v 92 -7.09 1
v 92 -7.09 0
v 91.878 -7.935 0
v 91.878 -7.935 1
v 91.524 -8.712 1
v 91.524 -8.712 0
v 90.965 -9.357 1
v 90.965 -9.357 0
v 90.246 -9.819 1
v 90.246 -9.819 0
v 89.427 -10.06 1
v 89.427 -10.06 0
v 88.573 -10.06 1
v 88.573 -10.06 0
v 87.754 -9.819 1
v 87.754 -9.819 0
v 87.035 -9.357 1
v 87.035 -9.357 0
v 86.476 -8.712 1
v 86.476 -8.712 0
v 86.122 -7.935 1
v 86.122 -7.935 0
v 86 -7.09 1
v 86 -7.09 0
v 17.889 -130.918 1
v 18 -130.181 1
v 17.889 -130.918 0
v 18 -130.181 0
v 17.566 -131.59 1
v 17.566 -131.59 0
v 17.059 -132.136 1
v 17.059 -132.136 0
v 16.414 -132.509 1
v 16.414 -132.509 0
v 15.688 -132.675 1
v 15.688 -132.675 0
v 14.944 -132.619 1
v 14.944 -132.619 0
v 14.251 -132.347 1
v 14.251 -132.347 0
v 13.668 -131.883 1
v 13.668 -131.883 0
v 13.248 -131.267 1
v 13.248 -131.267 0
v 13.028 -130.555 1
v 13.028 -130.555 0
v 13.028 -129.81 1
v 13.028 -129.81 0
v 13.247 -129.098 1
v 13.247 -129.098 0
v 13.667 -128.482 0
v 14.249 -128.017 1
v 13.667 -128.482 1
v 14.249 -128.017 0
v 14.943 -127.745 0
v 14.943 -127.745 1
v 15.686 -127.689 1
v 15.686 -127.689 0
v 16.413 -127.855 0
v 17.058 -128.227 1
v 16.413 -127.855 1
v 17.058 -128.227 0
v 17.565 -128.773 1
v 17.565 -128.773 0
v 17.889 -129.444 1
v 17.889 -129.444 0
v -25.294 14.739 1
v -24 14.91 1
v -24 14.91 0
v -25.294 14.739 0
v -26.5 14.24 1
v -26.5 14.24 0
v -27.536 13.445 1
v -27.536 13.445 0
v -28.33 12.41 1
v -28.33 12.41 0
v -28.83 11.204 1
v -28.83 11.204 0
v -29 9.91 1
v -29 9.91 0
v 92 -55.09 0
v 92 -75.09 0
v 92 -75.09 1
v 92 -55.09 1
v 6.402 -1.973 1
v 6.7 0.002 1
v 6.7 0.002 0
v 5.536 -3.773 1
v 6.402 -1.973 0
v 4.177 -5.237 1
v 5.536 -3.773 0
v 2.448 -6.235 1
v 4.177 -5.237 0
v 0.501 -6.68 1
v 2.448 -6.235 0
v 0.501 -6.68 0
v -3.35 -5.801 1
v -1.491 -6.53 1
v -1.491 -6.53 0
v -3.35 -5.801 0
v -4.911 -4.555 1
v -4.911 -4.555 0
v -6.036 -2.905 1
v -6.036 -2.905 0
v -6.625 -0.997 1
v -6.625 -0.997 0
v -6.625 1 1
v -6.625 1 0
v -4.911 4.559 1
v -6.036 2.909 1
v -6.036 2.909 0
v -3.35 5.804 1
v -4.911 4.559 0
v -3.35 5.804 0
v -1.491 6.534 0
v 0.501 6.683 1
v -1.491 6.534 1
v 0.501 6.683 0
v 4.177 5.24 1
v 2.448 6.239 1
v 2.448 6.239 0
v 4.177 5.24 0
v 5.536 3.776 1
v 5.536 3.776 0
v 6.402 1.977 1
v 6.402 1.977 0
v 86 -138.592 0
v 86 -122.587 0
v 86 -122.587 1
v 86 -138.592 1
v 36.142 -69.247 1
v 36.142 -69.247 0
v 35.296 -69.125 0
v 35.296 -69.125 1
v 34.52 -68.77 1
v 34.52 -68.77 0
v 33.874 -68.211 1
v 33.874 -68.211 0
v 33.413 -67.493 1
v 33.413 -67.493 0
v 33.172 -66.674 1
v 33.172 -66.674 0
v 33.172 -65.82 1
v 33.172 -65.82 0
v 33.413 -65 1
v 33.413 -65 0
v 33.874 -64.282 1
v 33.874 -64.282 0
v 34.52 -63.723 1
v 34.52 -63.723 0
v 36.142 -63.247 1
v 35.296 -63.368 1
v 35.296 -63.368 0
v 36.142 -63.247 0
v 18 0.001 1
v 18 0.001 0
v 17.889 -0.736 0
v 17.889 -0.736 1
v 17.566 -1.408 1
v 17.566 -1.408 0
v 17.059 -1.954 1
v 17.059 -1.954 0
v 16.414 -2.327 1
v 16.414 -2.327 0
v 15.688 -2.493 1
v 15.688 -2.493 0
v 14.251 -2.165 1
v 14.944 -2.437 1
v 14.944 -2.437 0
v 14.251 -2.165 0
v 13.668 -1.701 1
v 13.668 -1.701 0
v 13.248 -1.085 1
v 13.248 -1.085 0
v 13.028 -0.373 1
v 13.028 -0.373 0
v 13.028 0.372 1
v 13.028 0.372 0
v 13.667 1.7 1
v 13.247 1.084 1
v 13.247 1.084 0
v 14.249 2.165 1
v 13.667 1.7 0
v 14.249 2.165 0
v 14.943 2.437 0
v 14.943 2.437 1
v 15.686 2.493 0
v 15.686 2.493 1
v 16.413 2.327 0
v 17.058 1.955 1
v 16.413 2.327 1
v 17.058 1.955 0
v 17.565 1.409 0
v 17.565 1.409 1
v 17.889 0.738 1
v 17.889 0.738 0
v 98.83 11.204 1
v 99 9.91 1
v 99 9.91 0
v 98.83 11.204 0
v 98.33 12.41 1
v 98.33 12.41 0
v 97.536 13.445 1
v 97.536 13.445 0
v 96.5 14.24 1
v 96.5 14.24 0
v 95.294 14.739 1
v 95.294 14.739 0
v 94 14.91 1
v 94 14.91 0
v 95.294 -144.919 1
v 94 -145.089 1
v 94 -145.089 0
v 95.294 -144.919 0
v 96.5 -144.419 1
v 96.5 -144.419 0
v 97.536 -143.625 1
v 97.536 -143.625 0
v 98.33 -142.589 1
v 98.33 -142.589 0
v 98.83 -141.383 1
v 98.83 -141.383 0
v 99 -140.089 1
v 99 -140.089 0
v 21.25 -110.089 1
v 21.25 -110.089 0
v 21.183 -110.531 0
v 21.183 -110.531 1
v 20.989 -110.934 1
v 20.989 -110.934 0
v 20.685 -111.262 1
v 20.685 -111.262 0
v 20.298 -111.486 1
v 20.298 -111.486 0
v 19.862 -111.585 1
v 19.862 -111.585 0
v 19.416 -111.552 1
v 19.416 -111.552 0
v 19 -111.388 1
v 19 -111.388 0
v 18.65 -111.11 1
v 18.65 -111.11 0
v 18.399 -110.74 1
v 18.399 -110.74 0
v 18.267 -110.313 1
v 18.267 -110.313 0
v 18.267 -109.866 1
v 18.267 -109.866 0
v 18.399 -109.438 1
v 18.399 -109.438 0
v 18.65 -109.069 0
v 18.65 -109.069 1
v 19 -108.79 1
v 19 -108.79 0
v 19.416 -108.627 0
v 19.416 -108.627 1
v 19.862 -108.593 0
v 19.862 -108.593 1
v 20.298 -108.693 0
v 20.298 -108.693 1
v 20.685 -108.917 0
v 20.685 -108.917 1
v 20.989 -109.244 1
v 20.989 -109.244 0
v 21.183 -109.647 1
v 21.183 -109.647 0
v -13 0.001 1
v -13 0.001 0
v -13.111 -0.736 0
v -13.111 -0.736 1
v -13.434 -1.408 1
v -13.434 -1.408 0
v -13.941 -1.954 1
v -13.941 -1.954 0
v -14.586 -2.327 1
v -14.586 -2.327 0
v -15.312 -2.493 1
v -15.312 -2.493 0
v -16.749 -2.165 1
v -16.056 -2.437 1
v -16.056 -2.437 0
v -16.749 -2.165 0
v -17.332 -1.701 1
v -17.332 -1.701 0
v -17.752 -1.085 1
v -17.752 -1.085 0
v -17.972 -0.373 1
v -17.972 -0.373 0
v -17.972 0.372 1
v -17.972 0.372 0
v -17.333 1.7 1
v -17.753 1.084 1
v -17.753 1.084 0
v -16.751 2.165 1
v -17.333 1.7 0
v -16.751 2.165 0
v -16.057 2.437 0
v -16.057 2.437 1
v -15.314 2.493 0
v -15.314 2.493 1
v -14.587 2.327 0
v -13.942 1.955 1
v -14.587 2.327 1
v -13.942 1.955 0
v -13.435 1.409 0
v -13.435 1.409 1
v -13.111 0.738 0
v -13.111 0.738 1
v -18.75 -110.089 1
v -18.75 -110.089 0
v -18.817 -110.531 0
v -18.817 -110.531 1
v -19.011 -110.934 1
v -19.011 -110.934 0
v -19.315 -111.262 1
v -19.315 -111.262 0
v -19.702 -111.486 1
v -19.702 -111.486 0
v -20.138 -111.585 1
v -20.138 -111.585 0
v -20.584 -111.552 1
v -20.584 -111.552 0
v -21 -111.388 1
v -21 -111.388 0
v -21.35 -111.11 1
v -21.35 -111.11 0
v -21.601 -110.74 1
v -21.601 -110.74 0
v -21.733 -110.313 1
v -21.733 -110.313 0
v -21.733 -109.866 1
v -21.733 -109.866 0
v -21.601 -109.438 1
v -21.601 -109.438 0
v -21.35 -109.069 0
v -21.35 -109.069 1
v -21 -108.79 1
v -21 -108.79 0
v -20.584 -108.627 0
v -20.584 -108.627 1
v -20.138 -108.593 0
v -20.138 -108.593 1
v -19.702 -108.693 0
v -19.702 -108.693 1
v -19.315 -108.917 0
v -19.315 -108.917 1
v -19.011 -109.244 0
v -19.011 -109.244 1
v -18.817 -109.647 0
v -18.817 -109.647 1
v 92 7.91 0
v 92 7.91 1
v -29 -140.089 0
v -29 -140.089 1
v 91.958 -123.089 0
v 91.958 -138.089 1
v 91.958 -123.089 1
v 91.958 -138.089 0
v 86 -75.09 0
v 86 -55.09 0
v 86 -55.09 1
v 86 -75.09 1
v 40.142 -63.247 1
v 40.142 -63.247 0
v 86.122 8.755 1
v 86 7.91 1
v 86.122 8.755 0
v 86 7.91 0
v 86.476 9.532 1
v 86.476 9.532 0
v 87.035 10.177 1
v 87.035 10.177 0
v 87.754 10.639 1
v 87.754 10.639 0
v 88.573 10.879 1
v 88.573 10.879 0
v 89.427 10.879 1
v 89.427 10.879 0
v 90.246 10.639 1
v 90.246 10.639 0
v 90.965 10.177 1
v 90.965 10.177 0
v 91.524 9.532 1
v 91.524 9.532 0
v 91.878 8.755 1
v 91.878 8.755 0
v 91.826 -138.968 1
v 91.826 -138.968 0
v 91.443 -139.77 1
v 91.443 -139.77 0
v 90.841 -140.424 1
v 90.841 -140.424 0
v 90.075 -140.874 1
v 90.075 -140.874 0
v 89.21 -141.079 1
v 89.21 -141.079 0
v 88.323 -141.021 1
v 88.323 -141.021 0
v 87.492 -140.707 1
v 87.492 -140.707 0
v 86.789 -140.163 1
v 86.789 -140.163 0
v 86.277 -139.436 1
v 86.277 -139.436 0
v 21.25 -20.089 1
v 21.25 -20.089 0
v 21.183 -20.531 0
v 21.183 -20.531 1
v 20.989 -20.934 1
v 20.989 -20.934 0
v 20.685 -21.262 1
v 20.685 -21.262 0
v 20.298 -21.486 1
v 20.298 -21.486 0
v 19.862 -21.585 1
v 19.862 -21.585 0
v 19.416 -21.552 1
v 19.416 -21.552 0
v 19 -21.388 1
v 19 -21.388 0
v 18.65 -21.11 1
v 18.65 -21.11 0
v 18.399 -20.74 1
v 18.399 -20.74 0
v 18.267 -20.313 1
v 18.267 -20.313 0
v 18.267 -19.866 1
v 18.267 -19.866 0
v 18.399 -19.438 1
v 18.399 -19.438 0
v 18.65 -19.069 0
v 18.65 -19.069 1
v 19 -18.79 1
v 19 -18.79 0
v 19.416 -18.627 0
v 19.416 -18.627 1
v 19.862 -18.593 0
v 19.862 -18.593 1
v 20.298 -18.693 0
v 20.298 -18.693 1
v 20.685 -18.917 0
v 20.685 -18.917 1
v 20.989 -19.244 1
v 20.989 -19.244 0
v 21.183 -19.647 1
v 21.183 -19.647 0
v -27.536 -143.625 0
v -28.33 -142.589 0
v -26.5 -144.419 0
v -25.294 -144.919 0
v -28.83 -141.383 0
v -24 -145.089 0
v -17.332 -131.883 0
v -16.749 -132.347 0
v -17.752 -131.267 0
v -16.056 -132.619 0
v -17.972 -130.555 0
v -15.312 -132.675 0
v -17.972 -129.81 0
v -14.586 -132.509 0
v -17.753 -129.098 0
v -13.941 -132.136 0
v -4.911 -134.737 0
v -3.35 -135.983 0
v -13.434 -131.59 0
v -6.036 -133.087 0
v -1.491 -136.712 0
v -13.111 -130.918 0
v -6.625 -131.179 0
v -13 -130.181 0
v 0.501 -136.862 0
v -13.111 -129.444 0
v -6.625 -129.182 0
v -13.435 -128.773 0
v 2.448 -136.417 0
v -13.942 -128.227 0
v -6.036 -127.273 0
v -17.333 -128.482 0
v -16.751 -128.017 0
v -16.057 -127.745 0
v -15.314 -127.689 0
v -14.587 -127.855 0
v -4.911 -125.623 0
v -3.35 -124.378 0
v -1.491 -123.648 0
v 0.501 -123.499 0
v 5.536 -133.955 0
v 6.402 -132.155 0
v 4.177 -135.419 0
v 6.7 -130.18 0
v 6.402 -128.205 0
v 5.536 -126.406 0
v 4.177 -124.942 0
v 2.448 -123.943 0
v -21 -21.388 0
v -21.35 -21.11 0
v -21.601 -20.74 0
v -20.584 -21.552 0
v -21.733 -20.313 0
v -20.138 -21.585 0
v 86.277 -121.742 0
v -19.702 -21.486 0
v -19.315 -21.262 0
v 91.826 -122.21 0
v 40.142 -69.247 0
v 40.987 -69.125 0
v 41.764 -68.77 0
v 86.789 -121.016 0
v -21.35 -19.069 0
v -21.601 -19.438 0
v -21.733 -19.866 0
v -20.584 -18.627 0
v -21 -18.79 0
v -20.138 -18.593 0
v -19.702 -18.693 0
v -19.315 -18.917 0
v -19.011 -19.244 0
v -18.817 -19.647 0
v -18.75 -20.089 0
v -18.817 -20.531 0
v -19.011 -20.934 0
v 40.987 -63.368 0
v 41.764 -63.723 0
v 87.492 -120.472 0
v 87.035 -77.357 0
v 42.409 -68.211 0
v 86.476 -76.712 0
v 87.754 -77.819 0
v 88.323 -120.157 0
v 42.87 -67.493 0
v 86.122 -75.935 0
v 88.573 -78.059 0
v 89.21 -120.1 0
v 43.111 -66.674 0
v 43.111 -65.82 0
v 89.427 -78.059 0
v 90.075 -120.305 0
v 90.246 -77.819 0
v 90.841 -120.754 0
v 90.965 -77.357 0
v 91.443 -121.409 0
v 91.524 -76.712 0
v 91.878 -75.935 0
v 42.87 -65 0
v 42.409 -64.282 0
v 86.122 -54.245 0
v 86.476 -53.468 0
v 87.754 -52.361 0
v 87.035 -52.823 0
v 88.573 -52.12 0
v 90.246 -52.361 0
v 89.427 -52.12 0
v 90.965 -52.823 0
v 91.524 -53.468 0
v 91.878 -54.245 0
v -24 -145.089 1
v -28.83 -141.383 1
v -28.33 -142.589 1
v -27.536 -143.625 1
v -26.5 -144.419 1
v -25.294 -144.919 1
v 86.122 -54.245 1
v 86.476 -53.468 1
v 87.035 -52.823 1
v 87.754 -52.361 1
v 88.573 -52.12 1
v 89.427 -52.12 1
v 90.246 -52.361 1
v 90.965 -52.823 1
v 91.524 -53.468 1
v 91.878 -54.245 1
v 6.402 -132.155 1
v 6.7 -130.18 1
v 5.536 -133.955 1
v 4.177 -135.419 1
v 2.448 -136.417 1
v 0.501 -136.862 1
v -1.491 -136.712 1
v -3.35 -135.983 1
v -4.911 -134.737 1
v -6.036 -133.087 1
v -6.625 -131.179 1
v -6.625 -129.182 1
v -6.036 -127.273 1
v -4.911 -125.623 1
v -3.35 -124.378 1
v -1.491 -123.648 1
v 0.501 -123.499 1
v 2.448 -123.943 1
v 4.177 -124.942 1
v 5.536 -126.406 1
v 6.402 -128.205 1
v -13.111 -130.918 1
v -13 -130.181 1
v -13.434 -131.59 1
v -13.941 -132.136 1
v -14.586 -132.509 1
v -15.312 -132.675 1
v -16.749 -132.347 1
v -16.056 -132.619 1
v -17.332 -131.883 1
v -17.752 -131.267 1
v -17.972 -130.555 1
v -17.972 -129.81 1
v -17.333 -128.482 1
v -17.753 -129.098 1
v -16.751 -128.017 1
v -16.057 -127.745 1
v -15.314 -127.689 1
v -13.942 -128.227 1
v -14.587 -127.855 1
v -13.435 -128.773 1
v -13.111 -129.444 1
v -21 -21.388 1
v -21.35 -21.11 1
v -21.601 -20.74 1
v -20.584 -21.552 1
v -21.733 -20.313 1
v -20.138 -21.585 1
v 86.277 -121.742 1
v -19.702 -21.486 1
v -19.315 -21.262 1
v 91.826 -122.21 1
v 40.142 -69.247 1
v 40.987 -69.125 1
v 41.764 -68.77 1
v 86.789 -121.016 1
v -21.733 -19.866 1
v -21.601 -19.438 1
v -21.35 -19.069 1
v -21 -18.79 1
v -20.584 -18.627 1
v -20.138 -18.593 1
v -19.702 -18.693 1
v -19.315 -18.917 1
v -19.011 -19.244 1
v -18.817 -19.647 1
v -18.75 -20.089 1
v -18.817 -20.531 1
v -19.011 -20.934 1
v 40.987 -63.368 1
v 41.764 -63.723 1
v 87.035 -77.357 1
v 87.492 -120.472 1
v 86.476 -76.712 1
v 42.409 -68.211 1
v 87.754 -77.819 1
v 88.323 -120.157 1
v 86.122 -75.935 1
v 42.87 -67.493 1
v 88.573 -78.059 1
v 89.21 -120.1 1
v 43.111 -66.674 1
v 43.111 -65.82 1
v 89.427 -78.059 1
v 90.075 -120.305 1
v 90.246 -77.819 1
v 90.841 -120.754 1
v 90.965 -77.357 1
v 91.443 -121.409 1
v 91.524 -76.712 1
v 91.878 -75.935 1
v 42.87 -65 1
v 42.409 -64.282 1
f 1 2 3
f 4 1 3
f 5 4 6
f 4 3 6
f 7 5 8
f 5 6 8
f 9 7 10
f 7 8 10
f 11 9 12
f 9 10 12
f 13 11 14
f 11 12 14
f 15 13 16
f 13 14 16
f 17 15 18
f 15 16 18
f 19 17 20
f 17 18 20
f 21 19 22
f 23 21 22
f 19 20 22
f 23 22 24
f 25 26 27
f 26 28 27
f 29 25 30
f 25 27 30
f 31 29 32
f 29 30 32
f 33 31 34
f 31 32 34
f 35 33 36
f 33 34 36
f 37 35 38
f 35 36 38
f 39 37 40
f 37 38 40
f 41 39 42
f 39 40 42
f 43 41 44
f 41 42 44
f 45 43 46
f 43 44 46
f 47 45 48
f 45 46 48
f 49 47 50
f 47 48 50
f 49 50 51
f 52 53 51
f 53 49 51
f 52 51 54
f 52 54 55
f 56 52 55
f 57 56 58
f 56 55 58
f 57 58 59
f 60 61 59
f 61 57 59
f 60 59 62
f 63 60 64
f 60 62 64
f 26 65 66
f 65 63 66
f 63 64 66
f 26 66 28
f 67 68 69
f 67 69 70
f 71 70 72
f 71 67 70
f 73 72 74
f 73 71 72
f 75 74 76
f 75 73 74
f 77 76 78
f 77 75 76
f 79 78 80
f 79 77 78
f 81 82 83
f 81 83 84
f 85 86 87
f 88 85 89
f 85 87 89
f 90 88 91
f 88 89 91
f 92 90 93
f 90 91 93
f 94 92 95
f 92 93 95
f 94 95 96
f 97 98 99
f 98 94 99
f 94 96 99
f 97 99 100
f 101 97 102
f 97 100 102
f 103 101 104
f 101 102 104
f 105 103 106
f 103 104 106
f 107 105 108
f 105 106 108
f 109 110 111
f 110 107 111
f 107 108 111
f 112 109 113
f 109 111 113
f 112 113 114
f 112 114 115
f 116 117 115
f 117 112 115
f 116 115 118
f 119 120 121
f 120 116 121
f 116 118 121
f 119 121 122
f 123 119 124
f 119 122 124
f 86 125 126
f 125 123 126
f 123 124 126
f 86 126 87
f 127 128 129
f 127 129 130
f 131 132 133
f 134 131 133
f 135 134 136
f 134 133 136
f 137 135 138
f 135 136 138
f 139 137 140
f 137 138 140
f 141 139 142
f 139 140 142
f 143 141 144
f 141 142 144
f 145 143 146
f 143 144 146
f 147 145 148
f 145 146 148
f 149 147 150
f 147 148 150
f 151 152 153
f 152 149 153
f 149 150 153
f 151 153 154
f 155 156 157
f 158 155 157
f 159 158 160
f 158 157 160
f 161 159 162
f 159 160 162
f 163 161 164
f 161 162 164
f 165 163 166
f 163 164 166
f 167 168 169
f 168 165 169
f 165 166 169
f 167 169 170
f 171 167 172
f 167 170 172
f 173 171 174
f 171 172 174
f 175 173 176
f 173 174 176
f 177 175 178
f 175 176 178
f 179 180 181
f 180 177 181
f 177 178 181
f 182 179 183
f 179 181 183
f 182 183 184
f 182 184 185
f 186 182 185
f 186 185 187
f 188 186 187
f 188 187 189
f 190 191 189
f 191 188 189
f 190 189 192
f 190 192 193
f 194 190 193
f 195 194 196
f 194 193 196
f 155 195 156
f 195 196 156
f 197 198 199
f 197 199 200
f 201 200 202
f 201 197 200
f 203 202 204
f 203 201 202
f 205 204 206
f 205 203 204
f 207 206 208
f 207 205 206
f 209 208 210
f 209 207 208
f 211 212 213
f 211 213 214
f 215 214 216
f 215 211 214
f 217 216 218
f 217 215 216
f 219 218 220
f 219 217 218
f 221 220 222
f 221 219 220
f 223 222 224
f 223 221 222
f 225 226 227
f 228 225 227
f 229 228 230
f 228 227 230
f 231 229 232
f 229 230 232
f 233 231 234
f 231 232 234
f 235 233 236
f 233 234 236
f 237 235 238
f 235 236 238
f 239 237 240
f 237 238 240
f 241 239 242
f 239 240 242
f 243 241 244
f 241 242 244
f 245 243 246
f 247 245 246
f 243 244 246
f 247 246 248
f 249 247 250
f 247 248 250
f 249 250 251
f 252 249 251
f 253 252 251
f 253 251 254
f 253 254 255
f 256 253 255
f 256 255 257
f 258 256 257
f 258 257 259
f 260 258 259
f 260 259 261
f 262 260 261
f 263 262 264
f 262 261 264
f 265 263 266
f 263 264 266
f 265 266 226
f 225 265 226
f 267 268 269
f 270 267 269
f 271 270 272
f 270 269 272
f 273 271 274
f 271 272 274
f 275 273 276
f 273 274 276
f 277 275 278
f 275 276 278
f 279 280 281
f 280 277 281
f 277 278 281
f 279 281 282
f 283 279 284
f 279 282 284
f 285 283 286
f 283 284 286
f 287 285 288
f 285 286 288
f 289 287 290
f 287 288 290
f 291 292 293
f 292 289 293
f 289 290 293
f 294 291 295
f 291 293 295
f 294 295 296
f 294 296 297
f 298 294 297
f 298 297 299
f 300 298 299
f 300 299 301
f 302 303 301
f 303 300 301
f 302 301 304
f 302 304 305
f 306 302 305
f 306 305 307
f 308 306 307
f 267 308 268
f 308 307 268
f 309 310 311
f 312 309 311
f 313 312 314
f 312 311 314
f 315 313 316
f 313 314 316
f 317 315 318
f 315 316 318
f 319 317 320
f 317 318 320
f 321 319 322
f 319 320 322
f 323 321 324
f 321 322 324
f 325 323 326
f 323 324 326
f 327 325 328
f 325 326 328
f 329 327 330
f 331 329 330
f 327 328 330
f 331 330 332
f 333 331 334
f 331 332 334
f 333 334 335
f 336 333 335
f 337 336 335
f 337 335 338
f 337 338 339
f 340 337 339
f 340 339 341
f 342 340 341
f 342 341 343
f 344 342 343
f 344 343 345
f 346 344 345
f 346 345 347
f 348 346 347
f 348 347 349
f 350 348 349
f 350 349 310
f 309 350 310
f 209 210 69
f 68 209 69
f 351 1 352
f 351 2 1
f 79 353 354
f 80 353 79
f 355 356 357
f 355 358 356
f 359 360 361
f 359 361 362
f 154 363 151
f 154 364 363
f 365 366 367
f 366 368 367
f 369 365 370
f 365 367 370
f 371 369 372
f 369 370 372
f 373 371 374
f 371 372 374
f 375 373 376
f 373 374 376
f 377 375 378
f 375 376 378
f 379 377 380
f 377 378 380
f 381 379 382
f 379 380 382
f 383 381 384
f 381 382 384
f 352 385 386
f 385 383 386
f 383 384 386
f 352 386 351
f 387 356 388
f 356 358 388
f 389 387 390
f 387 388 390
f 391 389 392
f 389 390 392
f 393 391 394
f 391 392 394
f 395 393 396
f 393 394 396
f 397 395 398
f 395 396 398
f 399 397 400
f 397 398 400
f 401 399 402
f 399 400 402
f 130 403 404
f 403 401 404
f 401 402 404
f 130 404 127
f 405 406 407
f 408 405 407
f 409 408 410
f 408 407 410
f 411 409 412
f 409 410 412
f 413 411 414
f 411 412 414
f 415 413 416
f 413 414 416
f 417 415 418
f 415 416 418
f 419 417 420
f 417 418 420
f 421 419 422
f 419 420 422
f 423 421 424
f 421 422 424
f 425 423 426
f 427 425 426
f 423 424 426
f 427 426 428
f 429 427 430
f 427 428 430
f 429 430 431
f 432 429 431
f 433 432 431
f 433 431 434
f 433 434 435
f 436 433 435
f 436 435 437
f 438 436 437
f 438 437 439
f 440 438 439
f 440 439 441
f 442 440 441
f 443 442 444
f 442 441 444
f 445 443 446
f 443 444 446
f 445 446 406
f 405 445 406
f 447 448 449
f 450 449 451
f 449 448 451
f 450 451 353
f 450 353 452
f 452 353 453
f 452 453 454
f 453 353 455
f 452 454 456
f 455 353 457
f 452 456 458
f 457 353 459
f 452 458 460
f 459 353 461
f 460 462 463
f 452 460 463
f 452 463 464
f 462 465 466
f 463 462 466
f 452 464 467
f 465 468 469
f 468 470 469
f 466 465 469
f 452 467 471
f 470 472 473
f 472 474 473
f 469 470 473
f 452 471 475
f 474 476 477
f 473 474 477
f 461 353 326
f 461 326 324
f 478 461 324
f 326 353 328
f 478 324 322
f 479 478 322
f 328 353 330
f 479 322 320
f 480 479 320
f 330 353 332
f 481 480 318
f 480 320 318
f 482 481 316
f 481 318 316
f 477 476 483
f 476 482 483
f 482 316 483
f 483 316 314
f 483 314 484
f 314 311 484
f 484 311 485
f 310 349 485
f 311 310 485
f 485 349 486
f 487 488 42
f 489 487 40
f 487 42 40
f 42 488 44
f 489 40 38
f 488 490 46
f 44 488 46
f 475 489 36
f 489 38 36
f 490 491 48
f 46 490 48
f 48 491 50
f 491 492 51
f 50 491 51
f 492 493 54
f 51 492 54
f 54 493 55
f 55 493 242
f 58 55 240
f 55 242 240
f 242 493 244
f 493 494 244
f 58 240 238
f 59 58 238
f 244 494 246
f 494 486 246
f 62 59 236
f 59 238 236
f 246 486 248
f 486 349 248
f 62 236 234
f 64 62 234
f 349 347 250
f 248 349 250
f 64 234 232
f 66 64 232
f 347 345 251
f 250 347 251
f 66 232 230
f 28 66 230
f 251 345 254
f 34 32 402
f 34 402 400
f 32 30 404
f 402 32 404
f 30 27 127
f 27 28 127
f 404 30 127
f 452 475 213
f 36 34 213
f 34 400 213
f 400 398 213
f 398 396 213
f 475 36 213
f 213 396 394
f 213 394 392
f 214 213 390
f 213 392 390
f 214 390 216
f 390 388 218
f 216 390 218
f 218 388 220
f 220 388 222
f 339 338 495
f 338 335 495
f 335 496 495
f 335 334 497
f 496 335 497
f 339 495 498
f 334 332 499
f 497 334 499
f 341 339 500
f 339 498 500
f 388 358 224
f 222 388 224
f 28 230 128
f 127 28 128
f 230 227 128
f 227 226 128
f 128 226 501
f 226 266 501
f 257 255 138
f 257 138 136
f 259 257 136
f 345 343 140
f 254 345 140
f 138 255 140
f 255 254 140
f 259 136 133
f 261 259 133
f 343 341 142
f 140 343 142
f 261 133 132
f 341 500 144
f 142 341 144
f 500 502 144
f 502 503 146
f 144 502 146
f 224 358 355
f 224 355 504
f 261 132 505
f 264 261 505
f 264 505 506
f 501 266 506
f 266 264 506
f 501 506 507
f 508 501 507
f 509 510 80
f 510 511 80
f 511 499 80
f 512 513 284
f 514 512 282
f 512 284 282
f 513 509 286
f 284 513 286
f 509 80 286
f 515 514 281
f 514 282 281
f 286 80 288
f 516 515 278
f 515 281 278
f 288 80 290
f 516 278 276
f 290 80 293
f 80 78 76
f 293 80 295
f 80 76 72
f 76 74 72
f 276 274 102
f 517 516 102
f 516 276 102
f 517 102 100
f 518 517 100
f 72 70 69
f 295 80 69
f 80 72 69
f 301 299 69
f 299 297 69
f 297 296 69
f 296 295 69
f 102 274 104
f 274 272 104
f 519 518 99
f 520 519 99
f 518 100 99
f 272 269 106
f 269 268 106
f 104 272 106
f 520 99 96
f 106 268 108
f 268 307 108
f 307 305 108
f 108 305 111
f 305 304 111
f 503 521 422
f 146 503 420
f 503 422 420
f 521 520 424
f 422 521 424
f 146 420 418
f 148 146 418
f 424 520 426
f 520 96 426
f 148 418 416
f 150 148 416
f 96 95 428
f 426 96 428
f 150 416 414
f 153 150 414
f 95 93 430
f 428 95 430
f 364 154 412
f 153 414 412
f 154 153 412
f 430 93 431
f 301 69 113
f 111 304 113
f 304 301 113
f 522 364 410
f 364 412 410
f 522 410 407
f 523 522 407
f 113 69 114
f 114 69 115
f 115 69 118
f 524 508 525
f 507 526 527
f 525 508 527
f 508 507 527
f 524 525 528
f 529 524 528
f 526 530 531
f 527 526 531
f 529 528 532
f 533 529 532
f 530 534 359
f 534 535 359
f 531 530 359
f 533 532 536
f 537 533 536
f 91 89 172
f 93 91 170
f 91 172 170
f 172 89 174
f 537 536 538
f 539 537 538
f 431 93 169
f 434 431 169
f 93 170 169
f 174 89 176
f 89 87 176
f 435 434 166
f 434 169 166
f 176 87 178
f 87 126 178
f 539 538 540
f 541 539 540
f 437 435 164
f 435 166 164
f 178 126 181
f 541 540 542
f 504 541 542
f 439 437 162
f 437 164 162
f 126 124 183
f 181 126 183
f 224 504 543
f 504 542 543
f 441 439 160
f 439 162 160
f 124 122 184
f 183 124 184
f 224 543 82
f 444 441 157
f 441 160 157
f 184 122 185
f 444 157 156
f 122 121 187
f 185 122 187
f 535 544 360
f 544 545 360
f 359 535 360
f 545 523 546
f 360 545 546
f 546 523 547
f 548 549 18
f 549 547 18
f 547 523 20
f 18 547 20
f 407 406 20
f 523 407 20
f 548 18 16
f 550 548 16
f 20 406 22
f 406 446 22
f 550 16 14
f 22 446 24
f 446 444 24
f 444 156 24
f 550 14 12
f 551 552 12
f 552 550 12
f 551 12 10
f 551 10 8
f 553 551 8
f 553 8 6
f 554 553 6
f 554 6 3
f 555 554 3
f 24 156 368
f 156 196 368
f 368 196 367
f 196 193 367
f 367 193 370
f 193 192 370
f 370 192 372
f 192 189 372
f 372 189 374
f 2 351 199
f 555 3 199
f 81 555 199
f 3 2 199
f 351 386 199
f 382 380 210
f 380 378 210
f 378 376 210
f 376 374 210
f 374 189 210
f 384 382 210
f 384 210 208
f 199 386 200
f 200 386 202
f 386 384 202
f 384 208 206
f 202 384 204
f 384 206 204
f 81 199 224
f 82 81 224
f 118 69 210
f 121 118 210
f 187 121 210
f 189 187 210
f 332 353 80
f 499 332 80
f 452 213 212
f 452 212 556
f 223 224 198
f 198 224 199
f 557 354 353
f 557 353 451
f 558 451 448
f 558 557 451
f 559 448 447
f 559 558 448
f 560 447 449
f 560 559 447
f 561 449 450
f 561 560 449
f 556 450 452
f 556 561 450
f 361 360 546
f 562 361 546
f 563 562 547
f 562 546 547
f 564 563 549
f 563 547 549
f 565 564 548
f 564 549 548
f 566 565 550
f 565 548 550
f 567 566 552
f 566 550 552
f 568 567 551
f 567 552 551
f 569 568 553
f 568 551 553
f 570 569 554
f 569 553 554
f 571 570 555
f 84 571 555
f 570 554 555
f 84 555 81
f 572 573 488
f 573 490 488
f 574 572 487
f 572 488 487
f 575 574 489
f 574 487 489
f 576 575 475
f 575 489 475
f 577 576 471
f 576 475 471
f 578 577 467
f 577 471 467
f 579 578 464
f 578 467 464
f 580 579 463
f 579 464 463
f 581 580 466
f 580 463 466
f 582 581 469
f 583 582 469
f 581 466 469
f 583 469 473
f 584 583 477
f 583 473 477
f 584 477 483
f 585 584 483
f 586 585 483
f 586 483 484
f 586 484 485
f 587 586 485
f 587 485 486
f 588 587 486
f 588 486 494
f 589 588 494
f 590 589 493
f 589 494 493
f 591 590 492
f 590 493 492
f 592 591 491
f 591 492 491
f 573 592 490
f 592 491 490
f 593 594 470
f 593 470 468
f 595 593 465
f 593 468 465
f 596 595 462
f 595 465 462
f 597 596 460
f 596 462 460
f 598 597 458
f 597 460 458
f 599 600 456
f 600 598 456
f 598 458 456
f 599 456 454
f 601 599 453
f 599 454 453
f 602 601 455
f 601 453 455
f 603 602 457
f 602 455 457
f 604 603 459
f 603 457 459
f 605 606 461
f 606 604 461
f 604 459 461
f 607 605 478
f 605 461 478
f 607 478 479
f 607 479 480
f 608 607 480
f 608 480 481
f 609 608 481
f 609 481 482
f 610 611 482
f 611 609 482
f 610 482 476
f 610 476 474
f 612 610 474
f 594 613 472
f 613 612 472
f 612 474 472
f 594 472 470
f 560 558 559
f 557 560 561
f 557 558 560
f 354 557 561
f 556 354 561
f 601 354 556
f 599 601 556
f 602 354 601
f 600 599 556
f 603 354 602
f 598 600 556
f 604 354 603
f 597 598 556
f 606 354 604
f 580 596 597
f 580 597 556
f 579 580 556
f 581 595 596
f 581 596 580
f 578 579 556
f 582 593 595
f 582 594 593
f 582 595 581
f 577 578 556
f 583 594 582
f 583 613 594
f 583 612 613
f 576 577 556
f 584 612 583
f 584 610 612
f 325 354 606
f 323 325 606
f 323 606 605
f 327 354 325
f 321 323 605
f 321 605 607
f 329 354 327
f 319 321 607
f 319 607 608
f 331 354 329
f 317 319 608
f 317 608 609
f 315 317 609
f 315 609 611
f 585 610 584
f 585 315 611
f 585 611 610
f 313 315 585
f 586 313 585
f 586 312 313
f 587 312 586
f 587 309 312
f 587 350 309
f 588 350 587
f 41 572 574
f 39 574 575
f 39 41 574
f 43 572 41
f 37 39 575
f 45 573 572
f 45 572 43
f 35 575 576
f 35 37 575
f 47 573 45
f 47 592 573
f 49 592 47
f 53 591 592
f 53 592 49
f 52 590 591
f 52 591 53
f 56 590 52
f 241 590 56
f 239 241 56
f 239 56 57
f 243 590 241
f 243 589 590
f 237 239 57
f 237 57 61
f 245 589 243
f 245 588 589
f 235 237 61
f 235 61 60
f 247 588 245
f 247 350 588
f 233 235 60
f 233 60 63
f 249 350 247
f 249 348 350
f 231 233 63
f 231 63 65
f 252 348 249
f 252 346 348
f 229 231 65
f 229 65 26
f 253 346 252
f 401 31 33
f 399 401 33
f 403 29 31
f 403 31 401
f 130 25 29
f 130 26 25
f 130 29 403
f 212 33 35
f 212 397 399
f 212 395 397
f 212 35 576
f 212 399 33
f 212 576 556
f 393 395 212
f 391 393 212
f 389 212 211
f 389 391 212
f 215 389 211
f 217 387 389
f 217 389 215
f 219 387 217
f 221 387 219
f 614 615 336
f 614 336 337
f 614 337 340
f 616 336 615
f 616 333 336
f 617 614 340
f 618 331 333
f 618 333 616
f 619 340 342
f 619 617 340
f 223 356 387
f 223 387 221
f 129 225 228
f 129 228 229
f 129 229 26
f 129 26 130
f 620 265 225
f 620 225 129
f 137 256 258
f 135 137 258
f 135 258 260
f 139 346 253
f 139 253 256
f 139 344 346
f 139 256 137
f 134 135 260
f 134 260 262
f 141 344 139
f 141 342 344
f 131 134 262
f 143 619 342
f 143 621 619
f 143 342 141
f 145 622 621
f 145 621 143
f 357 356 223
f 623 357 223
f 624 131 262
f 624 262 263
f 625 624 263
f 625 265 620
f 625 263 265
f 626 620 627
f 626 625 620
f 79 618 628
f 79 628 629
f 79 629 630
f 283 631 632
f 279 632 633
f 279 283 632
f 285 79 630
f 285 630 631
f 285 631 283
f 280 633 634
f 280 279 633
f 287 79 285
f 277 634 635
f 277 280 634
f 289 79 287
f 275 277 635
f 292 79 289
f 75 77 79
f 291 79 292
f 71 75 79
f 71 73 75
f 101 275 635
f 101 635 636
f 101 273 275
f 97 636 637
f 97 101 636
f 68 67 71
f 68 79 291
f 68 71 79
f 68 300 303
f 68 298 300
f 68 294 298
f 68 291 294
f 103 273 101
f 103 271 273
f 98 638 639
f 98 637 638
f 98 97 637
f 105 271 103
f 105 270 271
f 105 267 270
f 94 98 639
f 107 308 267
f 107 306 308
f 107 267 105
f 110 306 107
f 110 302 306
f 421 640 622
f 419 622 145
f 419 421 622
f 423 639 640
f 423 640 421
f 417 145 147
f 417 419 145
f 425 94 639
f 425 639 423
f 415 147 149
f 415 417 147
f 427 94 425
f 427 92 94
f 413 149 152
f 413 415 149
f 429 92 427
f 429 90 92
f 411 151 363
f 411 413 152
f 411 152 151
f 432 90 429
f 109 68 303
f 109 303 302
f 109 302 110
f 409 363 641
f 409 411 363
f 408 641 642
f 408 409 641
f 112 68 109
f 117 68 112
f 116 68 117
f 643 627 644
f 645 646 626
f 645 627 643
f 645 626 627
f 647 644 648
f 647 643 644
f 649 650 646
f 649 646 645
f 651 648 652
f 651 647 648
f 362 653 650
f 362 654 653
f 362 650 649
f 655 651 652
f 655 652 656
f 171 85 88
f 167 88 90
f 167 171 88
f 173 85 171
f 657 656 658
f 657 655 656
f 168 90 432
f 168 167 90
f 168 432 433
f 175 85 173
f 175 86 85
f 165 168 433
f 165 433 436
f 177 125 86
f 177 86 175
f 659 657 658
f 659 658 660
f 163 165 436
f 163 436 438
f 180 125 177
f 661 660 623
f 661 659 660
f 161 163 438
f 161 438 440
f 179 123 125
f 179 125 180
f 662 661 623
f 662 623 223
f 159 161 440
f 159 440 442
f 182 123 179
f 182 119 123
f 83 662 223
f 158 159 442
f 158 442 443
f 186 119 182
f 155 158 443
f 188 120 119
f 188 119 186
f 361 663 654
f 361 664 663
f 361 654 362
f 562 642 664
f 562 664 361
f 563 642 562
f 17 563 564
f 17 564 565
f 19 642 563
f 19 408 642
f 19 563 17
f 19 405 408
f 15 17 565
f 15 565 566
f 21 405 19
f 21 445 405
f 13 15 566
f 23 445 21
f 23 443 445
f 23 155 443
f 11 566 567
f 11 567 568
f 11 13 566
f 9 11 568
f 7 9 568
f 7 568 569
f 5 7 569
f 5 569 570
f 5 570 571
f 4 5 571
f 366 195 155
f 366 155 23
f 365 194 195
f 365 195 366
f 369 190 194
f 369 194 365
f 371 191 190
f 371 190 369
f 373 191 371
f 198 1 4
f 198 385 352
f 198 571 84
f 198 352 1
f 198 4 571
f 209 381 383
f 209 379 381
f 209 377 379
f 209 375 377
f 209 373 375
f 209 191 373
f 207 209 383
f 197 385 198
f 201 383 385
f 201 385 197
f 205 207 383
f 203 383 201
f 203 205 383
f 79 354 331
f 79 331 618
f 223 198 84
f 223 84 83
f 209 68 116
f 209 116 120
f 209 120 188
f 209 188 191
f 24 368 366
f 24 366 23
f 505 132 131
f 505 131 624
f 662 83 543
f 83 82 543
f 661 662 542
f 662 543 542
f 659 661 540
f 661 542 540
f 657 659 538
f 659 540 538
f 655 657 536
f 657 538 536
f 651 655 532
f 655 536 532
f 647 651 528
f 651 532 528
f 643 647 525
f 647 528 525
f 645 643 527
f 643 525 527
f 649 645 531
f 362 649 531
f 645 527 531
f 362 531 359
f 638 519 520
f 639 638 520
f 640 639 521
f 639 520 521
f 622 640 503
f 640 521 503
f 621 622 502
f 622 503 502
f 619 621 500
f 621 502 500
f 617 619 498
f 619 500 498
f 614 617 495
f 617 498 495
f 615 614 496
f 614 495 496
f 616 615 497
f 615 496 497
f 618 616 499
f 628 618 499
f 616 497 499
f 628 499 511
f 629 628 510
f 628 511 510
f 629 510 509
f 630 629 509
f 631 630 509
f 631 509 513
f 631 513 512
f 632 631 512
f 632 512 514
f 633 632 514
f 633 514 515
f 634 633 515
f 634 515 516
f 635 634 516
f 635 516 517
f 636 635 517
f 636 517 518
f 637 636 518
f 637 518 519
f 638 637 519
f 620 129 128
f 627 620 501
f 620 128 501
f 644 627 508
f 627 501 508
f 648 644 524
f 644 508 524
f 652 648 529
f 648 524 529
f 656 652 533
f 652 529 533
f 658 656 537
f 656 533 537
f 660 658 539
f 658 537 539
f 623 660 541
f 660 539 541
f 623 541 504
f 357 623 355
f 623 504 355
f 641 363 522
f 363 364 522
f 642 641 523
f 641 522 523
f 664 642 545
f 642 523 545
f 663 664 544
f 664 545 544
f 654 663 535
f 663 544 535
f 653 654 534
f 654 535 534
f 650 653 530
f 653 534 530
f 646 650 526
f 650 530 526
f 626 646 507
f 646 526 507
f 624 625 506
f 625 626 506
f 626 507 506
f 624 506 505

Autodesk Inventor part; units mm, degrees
ref_plane "YZ Plane" through (0, 0, 0) normal (1, 0, 0) x (0, 1, 0)
ref_plane "XZ Plane" through (0, 0, 0) normal (0, 1, 0) x (-1, 0, 0)
ref_plane "XY Plane" through (0, 0, 0) normal (0, 0, 1) x (1, 0, 0)
sketch "スケッチ1" plane through (0, 0, 0) normal (0, 0, 1) x (1, 0, 0)
  circle A0 centre (-15.5, 0) radius 2.5 projected
  circle A1 centre (15.5, 0) radius 2.5 projected
  circle A2 centre (0, 0) radius 11 projected
  line L0 (-15.1987, 13) -> (15.1987, 13) projected
  arc A3 (15.1987, -13) -> (15.1987, 13) centre (0, 0) ccw projected
  line L1 (15.1987, -13) -> (-15.1987, -13) projected
  arc A4 (-15.1987, 13) -> (-15.1987, -13) centre (0, 0) ccw projected
  circle A5 centre (-15.5, -130.182) radius 2.5 projected
  circle A6 centre (15.5, -130.182) radius 2.5 projected
  circle A7 centre (0, -130.182) radius 11 projected
  line L2 (-15.1987, -143.182) -> (15.1987, -143.182) projected
  arc A8 (-15.1987, -117.182) -> (-15.1987, -143.182) centre (0, -130.182) ccw projected
  line L3 (15.1987, -117.182) -> (-15.1987, -117.182) projected
  arc A9 (15.1987, -143.182) -> (15.1987, -117.182) centre (0, -130.182) ccw projected
  circle A10 centre (0, -130.182) radius 5 projected
  circle A11 centre (0, 0) radius 5 projected
  line L4 (-29, -33.3404) -> (-29, 14.9098) projected
  line L5 (99, -145.0893) -> (-29, -145.0893) projected
  line L6 (-29, -63.34) -> (-29, -33.3408)
  line L7 (99, -145.0893) -> (99, 14.9098)
  line L8 (99, 14.9098) -> (297.1795, 14.9098)
  line L9 (297.1795, 14.9098) -> (297.1795, -145.0893)
  line L10 (297.1795, -145.0893) -> (99, -145.0893)
  circle A12 centre (0, -130.1819) radius 55
  circle A13 centre (0, 0.0009) radius 55
  line L11 (297.1795, -145.0893) -> (237.1795, -145.0893)
  line L12 (237.1795, -145.0893) -> (237.1795, 14.9098)
  line L13 (237.1795, 14.9098) -> (297.1795, 14.9098)
  line L14 (297.1795, 14.9098) -> (297.1795, -145.0893)
  line L15 (99, 14.9098) -> (-29, 14.9098) projected
  line L16 (99, 14.9098) -> (99, -145.0893) projected
  line L17 (92, -168.0902) -> (92, 36.9098) projected
  line L18 (86, 36.9098) -> (86, -168.0902) projected
  line L19 (89, 7.9098) -> (89, -7.0902) construction
  line L20 (92, 7.9098) -> (92, -7.0902)
  line L21 (86, -7.0902) -> (86, 7.9098)
  arc A14 (92, 7.9098) -> (86, 7.9098) centre (89, 7.9098) ccw
  arc A15 (86, -7.0902) -> (92, -7.0902) centre (89, -7.0902) ccw
  line L22 (87.3545, -74.7724) -> (87.3545, -54.7724) construction
  line L23 (90.3545, -74.7724) -> (90.3545, -54.7724)
  line L24 (84.3545, -54.7724) -> (84.3545, -74.7724)
  arc A16 (84.3545, -74.7724) -> (90.3545, -74.7724) centre (87.3545, -74.7724) ccw
  arc A17 (90.3545, -54.7724) -> (84.3545, -54.7724) centre (87.3545, -54.7724) ccw
  line L25 (-29, -145.0893) -> (-0.25, -145.0893)
  line L26 (-0.25, -145.0893) -> (-0.25, 14.9098)
  line L27 (-0.25, 14.9098) -> (-29, 14.9098)
  line L28 (-29, 14.9098) -> (-29, -145.0893)
  line L29 (19.75, -105.0893) -> (19.75, -25.0893)
  line L30 (19.75, -25.0893) -> (-20.25, -25.0893)
  line L31 (-20.25, -25.0893) -> (-20.25, -105.0893)
  line L32 (-20.25, -105.0893) -> (19.75, -105.0893)
  line L33 (19.75, -105.0893) -> (-20.25, -25.0893) construction
  line L34 (19.75, -25.0893) -> (-20.25, -105.0893) construction
  line L35 (19.75, -110.0893) -> (19.75, -20.0893)
  line L36 (19.75, -20.0893) -> (-20.25, -20.0893)
  line L37 (-20.25, -20.0893) -> (-20.25, -110.0893)
  line L38 (-20.25, -110.0893) -> (19.75, -110.0893)
  line L39 (19.75, -110.0893) -> (-20.25, -20.0893) construction
  line L40 (19.75, -20.0893) -> (-20.25, -110.0893) construction
  circle A18 centre (19.75, -110.0893) radius 1.5
  circle A19 centre (19.75, -20.0893) radius 1.5
  circle A20 centre (-20.25, -20.0893) radius 1.5
  circle A21 centre (-20.25, -110.0893) radius 1.5
  line L41 (88.9576, -138.0893) -> (88.9576, -123.0893) construction
  line L42 (91.9576, -138.0893) -> (91.9576, -123.0893)
  line L43 (85.9576, -123.0893) -> (85.9576, -138.0893)
  arc A22 (85.9576, -138.0893) -> (91.9576, -138.0893) centre (88.9576, -138.0893) ccw
  arc A23 (91.9576, -123.0893) -> (85.9576, -123.0893) centre (88.9576, -123.0893) ccw
  line L44 (-15.829, -33.3462) -> (-29, -33.3404) projected
  line L45 (-29, -145.0893) -> (-29, -63.34) projected
  line L46 (-29, -63.34) -> (-16.162, -63.34) projected
  arc A24 (-16.162, -63.34) -> (-15.829, -33.3462) centre (-16.25, -48.3403) ccw projected
  line L47 (55.6416, -41.2467) -> (55.6416, -91.2467) projected
  arc A25 (55.6416, -91.2467) -> (80.6416, -91.2467) centre (68.1416, -91.2467) ccw projected
  line L48 (80.6416, -91.2467) -> (80.6416, -41.2467) projected
  arc A26 (80.6416, -41.2467) -> (55.6416, -41.2467) centre (68.1416, -41.2467) ccw projected
  line L49 (86, -55.0898) -> (86, -75.0898) projected
  arc A27 (86, -75.0898) -> (92, -75.0898) centre (89, -75.0898) ccw projected
  line L50 (92, -75.0898) -> (92, -55.0898) projected
  arc A28 (92, -55.0898) -> (86, -55.0898) centre (89, -55.0898) ccw projected
  circle A29 centre (48.7299, -140.0893) radius 1.5 projected
  circle A30 centre (14.75, -81.84) radius 15.8 projected
  circle A31 centre (-15.5, 0.0016) radius 2.5 projected
  circle A32 centre (-15.5, -130.1804) radius 2.5 projected
  arc A33 (86.1416, -121.2458) -> (90.1416, -121.2458) centre (88.1416, -121.2458) ccw projected
  line L51 (90.1416, -121.2458) -> (90.1416, -111.2458) projected
  arc A34 (90.1416, -111.2458) -> (86.1416, -111.2458) centre (88.1416, -111.2458) ccw projected
  line L52 (86.1416, -111.2458) -> (86.1416, -121.2458) projected
  arc A35 (56.1416, -21.2467) -> (60.1416, -21.2467) centre (58.1416, -21.2467) ccw projected
  line L53 (60.1416, -21.2467) -> (60.1416, -11.2467) projected
  arc A36 (60.1416, -11.2467) -> (56.1416, -11.2467) centre (58.1416, -11.2467) ccw projected
  line L54 (56.1416, -11.2467) -> (56.1416, -21.2467) projected
  arc A37 (92, 9.9098) -> (86, 9.9098) centre (89, 9.9098) ccw projected
  line L55 (86, 9.9098) -> (86, -0.0902) projected
  arc A38 (86, -0.0902) -> (92, -0.0902) centre (89, -0.0902) ccw projected
  line L56 (92, -0.0902) -> (92, 9.9098) projected
  arc A39 (56.1416, -121.2458) -> (60.1416, -121.2458) centre (58.1416, -121.2458) ccw projected
  line L57 (60.1416, -121.2458) -> (60.1416, -111.2458) projected
  arc A40 (60.1416, -111.2458) -> (56.1416, -111.2458) centre (58.1416, -111.2458) ccw projected
  line L58 (56.1416, -111.2458) -> (56.1416, -121.2458) projected
  circle A41 centre (68.7415, -140.0893) radius 1.5 projected
  circle A42 centre (0, -130.1803) radius 6.7 projected
  circle A43 centre (15.5, 0.0016) radius 2.5 projected
  circle A44 centre (0, 0.0017) radius 6.7 projected
  circle A45 centre (15.5, -130.1804) radius 2.5 projected
  circle A46 centre (48.73, 9.9098) radius 1.5 projected
  arc A47 (86, -140.0893) -> (92, -140.0893) centre (89, -140.0893) ccw projected
  line L59 (92, -140.0893) -> (92, -130.0893) projected
  arc A48 (92, -130.0893) -> (86, -130.0893) centre (89, -130.0893) ccw projected
  line L60 (86, -130.0893) -> (86, -140.0893) projected
  arc A49 (90.1416, -11.2467) -> (86.1416, -11.2467) centre (88.1416, -11.2467) ccw projected
  line L61 (86.1416, -11.2467) -> (86.1416, -21.2467) projected
  arc A50 (86.1416, -21.2467) -> (90.1416, -21.2467) centre (88.1416, -21.2467) ccw projected
  line L62 (90.1416, -21.2467) -> (90.1416, -11.2467) projected
  line L63 (40.1416, -63.2467) -> (36.1416, -63.2467) projected
  arc A51 (36.1416, -63.2467) -> (36.1416, -69.2467) centre (36.1416, -66.2467) ccw projected
  line L64 (36.1416, -69.2467) -> (40.1416, -69.2467) projected
  arc A52 (40.1416, -69.2467) -> (40.1416, -63.2467) centre (40.1416, -66.2467) ccw projected
  circle A53 centre (68.9885, 9.909) radius 1.5 projected
  circle A54 centre (68.9885, 9.9098) radius 1.5 projected
  line L65 (99, -145.0893) -> (79, -145.0893)
  line L66 (79, -145.0893) -> (79, 14.9098)
  line L67 (79, 14.9098) -> (99, 14.9098)
  line L68 (99, 14.9098) -> (99, -145.0893)
  point P0 (0, 0)
  point P1 (119, 14.909)
  point P2 (89, 0.4098)
  point P3 (92, 7.909)
  point P4 (92, -7.091)
  point P5 (86, -7.094)
  point P6 (86, 7.9142)
  point P7 (87.3545, -64.7724)
  point P8 (86, -7.0941)
  point P9 (86, 7.909)
  point P10 (92, -55.0901)
  point P11 (92, -75.0901)
  point P12 (86, -77.4492)
  point P13 (86, -52.0956)
  point P14 (114.2151, 14.909)
  point P15 (237.2519, 14.9098)
  point P16 (-0.25, -65.0893)
  point P17 (86, -7.0943)
  point P18 (86, -7.091)
  point P19 (88.9576, -130.5893)
  point P20 (86, -138.5921)
  point P21 (86, -122.5866)
  point P22 (112.6121, 14.909)
  point P23 (112.6121, 14.909)
  point P24 (92.6121, -145.0901)
  point P25 (92.6121, 14.909)
  point P26 (-0.25, -145.0901)
  point P27 (92.6121, 14.909)
  point P28 (-0.25, -145.0901)
  point P29 (237.1795, -145.0893)
  point P30 (237.1795, 14.909)
  point P31 (-29, -33.3412)
  point P32 (-29, -63.3408)
  point P33 (-0.25, -145.091)
  point P34 (-29, -33.3422)
  point P35 (-29, -63.3417)
  point P36 (-0.25, -145.091)
  point P37 (-0.25, -145.0908)
  point P38 (-0.25, -145.0908)
  point P39 (-0.25, -145.0905)
  point P40 (-0.25, -145.0905)
  point P41 (-0.25, -145.0902)
  point P42 (-0.25, -145.0902)
  point P43 (-0.25, -145.0899)
  point P44 (-0.25, -145.0899)
  point P45 (-0.25, -145.0896)
  point P46 (-0.25, -145.0896)
  point P47 (-0.25, -145.0893)
  point P48 (-0.25, -145.0893)
  point P49 (-13, -0.0021)
  point P50 (-18, 0.0038)
  point P51 (18, -0.0021)
  point P52 (13, 0.0038)
  point P53 (86, -7.0943)
  point P54 (-13, -130.1782)
  point P55 (-18, -130.1841)
  point P56 (18, -130.1782)
  point P57 (13, -130.1841)
  point P58 (92, -55.0881)
  point P59 (92, -75.0915)
  point P60 (86, -75.0915)
  point P61 (86, -55.0881)
  dimension "d2" = 110
  dimension "d3" = 110
  dimension "d4" = 60
  dimension "d5" = 159.9991
  dimension "d10" = 7
  dimension "d11" = 15
  dimension "d12" = 6
  dimension "d14" = 20
  dimension "d17" = 80
  dimension "d18" = 40
  dimension "d19" = 159.9991
  dimension "d20" = 80
  dimension "d21" = 90
  dimension "d22" = 40
  dimension "d23" = 3
  dimension "d24" = 3
  dimension "d25" = 3
  dimension "d26" = 3
  dimension "d27" = 15
  dimension "d29" = 7
  dimension "d30" = 20
extrude "押し出し1" add sketch "スケッチ1" along normal blind 1 contours A2 L26 A44 | A2 L26 L0 A3 L1 | L26 A44 A2 | A2 L26 L1 A4 L0 | L26 L15 A13 L29 L35 A19 L36 L1 A3 L0 | L0 A4 L1 L26 L36 A20 L37 L31 L44 L4 L15 | L36 A19 L35 L30 L26 | L26 L30 L37 A20 L36 | L15 L66 A26 L47 A25 L5 A12 A30 L29 A13 | L30 L29 A13 L26 | L26 A13 A24 L44 L31 L30 | L44 L31 A13 L6 | A13 L31 L46 L6 | L15 L18 A17 L24 A16 A23 L43 A22 L5 L66 A25 L48 A26 | L26 A12 L31 L46 A24 A13 | A13 L29 A30 A12 L26 | L44 A24 A13 L31 | L46 L31 A12 L28 | A13 A24 L46 L31 | L15 L17 A37 L18 | L66 A25 L47 A26 | A26 L48 A25 L66 | L26 A30 L32 L31 A12 | A12 A30 L26 | A30 A12 L29 | L29 A12 A30 | A12 L31 L37 A21 L38 L26 L3 A8 L2 L5 L28 | L15 L7 L5 L17 | A37 L17 A14 L18 | A12 L29 A30 L26 | L26 A30 | A12 A30 L29 | L5 L26 L2 A9 L3 L38 A18 L35 L29 A30 A12 | L32 L26 L38 A21 L37 | A30 L29 L32 L26 | L18 A47 L17 L5 | L32 L35 A18 L38 L26 | L26 A7 L3 A9 L2 | L2 A8 L3 L26 A7 | A15 A49 L61 A50 L62 L17 A28 A17 L18 | L18 A22 L42 A48 L17 A47 | L26 A42 A7 | A7 L26 A42 | A17 A28 L18 | L18 A16 L24 A17 | A15 A49 L62 A50 L61 | A22 L43 A23 L18 | A48 L42 A23 L51 A34 L52 A33 L18 A16 A27 L17 | A27 A16 L18 | A33 L52 A34 L51 A23 | A29 | L54 A36 L53 A35 | L58 A40 L57 A39 | A41 | A46 | A53
sketch "スケッチ2" plane through (0, 0, 0) normal (0, 0, -1) x (-1, 0, 0)
  point P0 (0, 0)
fillet "フィレット1" radius 5 4 edges at (-29, -145.0893, 0.5) (-29, 14.9098, 0.5) (99, -145.0893, 0.5) (99, 14.9098, 0.5)
properties part number "前方後方板"
